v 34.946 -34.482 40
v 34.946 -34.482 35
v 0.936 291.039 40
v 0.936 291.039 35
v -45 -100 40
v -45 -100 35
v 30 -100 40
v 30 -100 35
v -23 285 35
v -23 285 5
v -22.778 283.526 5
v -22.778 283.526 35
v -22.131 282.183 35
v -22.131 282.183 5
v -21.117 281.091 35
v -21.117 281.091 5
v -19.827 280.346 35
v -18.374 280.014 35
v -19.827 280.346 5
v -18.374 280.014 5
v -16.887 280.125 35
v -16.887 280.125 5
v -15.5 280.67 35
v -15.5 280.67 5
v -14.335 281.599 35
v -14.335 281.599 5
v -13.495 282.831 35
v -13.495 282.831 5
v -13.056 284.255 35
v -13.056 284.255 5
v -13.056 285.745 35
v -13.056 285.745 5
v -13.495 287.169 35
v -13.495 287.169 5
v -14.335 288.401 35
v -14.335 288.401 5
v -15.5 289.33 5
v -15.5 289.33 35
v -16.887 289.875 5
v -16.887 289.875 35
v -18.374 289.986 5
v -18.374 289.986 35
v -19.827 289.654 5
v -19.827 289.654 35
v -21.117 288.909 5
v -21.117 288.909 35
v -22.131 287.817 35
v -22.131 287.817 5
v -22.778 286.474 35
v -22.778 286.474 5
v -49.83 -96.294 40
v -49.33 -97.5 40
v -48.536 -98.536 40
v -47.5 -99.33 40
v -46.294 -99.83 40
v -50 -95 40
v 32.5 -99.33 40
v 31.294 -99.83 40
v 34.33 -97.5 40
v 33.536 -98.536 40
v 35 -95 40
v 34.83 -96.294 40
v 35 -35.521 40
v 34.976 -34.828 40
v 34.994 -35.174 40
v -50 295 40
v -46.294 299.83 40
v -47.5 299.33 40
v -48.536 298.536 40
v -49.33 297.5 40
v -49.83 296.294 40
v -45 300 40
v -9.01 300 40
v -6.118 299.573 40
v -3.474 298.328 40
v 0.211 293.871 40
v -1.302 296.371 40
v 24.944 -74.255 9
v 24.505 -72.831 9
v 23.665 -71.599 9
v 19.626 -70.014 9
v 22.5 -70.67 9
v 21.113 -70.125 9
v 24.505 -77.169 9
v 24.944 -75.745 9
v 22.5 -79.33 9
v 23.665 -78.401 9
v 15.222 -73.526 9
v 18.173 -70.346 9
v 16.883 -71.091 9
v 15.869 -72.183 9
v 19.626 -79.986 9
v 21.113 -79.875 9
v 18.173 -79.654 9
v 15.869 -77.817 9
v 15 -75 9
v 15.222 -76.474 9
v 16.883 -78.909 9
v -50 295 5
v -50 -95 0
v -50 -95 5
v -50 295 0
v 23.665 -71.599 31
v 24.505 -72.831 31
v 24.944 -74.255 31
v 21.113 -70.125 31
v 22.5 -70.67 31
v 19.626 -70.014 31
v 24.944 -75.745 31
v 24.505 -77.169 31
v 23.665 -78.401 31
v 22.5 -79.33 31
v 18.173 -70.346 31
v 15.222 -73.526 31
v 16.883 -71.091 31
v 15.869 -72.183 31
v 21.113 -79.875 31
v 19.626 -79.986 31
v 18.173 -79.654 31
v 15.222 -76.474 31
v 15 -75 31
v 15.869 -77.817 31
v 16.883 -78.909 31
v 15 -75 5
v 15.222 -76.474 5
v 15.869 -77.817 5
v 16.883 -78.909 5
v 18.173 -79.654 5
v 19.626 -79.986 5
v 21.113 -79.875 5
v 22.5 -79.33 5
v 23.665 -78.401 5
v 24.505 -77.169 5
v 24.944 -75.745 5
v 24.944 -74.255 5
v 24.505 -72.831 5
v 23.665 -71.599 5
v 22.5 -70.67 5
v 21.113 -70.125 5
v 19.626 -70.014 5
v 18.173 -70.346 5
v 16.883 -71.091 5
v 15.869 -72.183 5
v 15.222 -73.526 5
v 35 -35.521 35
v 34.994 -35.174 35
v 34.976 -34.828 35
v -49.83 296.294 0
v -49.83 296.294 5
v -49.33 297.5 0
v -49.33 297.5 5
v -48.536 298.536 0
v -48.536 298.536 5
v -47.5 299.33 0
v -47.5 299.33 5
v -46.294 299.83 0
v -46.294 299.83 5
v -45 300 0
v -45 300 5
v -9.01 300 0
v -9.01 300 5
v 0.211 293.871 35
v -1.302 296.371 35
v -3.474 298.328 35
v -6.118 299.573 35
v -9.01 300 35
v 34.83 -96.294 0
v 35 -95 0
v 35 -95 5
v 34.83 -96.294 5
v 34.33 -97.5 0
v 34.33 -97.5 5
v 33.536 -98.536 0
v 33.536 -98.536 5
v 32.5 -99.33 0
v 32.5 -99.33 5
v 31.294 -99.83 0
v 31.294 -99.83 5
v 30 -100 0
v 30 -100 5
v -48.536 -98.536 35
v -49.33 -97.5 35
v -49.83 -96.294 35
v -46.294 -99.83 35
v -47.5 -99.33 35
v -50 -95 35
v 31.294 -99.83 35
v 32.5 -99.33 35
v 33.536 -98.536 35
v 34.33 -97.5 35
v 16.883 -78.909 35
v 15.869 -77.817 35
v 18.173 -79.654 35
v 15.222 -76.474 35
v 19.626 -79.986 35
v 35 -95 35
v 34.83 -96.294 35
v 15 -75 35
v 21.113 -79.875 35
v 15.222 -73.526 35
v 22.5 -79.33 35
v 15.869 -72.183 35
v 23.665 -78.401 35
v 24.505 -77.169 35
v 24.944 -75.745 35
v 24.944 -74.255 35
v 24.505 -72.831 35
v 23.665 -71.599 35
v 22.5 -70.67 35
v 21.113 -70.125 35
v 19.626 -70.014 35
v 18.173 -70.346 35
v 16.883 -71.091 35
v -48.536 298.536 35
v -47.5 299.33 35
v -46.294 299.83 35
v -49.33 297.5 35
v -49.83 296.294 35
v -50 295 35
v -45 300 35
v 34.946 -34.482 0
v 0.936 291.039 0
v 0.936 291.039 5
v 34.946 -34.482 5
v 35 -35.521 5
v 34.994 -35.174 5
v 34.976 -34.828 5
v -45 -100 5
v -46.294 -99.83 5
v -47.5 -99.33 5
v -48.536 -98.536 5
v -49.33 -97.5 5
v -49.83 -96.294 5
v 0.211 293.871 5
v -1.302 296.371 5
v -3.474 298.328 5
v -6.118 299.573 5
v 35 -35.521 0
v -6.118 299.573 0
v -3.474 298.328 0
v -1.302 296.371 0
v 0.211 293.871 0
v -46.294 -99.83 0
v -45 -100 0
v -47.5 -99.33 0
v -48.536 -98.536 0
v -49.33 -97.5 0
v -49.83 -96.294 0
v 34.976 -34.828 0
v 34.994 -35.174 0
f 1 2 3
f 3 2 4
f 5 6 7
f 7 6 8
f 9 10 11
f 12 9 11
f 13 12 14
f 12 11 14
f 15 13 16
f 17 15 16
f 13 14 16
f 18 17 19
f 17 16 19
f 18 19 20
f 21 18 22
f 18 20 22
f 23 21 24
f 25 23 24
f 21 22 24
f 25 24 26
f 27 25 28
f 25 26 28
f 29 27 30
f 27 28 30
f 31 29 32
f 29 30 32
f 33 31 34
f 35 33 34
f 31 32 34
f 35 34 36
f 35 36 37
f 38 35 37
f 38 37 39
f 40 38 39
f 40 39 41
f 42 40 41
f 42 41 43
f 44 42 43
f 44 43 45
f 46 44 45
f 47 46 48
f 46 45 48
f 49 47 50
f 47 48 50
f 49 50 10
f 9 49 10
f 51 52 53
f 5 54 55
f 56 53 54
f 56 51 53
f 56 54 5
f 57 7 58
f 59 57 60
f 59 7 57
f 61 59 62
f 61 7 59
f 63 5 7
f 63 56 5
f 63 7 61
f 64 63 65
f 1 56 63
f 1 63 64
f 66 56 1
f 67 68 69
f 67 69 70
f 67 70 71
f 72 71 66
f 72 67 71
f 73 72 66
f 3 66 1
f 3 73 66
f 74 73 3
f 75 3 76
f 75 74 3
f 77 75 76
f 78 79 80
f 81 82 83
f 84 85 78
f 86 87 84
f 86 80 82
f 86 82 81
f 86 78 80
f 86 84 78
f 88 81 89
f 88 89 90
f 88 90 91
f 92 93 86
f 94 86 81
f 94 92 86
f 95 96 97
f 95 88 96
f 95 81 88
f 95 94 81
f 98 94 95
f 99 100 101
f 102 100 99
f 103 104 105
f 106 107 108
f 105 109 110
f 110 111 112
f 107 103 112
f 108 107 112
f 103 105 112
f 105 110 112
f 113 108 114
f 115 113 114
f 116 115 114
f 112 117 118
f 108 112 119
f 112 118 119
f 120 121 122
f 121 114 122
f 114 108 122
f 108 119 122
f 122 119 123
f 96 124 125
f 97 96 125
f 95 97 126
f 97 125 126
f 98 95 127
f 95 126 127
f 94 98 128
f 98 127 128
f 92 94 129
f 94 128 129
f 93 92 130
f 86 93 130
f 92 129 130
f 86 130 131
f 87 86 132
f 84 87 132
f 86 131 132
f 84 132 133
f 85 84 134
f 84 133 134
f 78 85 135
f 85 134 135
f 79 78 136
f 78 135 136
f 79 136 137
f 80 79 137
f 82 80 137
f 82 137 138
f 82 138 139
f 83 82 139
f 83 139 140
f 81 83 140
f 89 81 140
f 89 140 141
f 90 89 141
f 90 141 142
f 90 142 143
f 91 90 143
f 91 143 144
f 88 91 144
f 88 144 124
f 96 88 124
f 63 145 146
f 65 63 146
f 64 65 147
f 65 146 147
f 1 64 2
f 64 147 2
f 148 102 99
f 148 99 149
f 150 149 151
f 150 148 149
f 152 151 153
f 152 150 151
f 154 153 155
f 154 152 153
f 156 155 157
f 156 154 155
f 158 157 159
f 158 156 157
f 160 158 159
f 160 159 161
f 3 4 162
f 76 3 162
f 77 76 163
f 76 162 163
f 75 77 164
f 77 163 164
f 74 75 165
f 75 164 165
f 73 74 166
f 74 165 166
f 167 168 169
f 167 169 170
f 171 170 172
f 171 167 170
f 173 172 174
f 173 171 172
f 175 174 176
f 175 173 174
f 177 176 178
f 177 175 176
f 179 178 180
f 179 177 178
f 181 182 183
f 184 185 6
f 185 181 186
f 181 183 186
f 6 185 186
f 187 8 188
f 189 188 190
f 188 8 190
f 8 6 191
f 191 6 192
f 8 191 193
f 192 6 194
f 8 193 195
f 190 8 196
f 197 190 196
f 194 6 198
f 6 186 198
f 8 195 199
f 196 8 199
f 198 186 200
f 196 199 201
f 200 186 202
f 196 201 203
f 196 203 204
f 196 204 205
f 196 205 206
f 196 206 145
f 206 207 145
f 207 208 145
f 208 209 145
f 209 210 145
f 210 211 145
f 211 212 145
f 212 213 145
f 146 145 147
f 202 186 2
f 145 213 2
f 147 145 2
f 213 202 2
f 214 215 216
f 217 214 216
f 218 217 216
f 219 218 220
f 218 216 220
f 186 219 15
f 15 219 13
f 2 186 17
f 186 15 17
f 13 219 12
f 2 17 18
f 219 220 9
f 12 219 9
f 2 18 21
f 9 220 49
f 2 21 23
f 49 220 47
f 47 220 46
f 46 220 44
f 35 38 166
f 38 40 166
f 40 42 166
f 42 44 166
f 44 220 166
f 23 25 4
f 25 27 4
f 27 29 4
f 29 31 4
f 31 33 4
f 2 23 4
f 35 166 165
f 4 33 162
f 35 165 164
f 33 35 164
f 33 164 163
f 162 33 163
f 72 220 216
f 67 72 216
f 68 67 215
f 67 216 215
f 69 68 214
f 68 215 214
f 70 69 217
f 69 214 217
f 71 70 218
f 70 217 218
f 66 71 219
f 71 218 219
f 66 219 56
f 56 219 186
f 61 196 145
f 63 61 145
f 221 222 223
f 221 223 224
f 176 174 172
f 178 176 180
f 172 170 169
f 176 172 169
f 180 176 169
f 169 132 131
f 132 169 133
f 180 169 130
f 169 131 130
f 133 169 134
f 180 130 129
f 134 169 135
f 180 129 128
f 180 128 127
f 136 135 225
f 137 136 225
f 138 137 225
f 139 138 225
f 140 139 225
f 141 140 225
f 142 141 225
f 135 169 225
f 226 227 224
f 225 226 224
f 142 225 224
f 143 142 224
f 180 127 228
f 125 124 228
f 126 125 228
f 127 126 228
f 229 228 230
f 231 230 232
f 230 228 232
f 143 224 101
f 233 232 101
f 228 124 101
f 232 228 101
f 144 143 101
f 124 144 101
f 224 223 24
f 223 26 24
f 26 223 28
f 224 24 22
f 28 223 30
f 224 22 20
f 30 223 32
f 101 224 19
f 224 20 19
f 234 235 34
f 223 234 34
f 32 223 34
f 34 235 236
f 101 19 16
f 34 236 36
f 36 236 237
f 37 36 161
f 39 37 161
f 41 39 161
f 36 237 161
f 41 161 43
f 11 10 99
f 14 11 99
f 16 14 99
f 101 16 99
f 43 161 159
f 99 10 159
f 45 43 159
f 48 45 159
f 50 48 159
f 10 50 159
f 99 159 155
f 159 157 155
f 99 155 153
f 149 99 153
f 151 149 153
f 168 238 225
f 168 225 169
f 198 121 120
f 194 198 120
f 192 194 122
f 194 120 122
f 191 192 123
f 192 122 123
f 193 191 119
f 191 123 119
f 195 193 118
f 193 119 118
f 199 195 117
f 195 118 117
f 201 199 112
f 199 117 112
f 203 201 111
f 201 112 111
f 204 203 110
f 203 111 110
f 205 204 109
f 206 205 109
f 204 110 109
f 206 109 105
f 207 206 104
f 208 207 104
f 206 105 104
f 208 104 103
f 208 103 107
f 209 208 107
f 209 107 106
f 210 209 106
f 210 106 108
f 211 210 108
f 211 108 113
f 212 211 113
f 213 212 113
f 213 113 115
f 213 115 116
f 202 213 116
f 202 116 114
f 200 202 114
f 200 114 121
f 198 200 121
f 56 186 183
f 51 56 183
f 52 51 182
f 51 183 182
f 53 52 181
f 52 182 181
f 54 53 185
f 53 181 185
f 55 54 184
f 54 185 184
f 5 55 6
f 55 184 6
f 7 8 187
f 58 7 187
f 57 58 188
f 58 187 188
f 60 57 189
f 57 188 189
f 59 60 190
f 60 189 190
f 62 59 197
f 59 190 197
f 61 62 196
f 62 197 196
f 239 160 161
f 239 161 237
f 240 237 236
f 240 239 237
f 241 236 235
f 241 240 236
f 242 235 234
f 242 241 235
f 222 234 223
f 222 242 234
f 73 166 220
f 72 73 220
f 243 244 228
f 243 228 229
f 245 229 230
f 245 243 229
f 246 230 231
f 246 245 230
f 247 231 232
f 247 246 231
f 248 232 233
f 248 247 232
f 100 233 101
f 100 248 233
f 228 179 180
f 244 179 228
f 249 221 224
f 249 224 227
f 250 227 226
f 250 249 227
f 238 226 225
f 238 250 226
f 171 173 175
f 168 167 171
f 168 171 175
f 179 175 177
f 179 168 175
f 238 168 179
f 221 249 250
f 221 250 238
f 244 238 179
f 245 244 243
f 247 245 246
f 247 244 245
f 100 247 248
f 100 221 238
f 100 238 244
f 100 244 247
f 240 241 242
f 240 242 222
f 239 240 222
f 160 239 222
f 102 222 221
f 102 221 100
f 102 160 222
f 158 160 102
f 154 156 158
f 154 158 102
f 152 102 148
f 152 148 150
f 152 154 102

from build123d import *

# Parameters (mm, degrees)
BOSS_EXTRUDE1_DEPTH     = 5
SKETCH3_R               = 5
BOSS_EXTRUDE2_DEPTH     = 30
BOSS_EXTRUDE3_DEPTH     = 5
CUT_EXTRUDE3_DEPTH      = 11
CUT_EXTRUDE3_DEPTH_BACK = 11
SKETCH5_R               = 5


with BuildPart() as part:
    # Sketch2 → Boss-Extrude1 (new body)
    with BuildSketch(Plane.XY):
        with BuildLine():
            Line((0.936211321, 291.039120216), (34.945864928, -34.48185003))
            ThreePointArc((34.945864928, -34.48185003), (34.986457062, -35.000705547), (35, -35.520970246))
            Line((35, -35.520970246), (35, -95))
            ThreePointArc((35, -95), (33.535533906, -98.535533906), (30, -100))
            Line((30, -100), (-45, -100))
            ThreePointArc((-45, -100), (-48.535533906, -98.535533906), (-50, -95))
            Line((-50, -95), (-50, 295))
            ThreePointArc((-50, 295), (-48.535533906, 298.535533906), (-45, 300))
            Line((-45, 300), (-9.009653608, 300))
            ThreePointArc((-9.009653608, 300), (-2.316044797, 297.429374205), (0.936211321, 291.039120216))
        make_face()
    extrude(amount=BOSS_EXTRUDE1_DEPTH)

    # Sketch3 → Boss-Extrude2 (add)
    with BuildSketch(Plane.XY.offset(5)):
        with Locations(Location((-18, 285, 0), (0, 0, 180))):
            Circle(SKETCH3_R)
        with Locations(Location((20, -75, 0), (0, 0, 180))):
            Circle(SKETCH3_R)
    extrude(amount=BOSS_EXTRUDE2_DEPTH)

    # Sketch4 → Boss-Extrude3 (add)
    with BuildSketch(Plane.XY.offset(35)):
        with BuildLine():
            Line((35, -95), (35, -35.520970246))
            ThreePointArc((35, -35.520970246), (34.986457062, -35.000705547), (34.945864928, -34.48185003))
            Line((34.945864928, -34.48185003), (0.936211321, 291.039120216))
            ThreePointArc((0.936211321, 291.039120216), (-2.316044797, 297.429374205), (-9.009653608, 300))
            Line((-9.009653608, 300), (-45, 300))
            ThreePointArc((-45, 300), (-48.535533906, 298.535533906), (-50, 295))
            Line((-50, 295), (-50, -95))
            ThreePointArc((-50, -95), (-48.535533906, -98.535533906), (-45, -100))
            Line((-45, -100), (30, -100))
            ThreePointArc((30, -100), (33.535533906, -98.535533906), (35, -95))
        make_face()
    extrude(amount=BOSS_EXTRUDE3_DEPTH)

    # Sketch5 → Cut-Extrude3 (cut, two sides: drawn at the far end of the back side and taken through both)
    with BuildSketch(Plane.XY.offset(20).offset(-CUT_EXTRUDE3_DEPTH_BACK)):
        with Locations(Location((20, -75, 0), (0, 0, 180))):
            Circle(SKETCH5_R)
    extrude(amount=CUT_EXTRUDE3_DEPTH + CUT_EXTRUDE3_DEPTH_BACK, mode=Mode.SUBTRACT)


solid = part.part
